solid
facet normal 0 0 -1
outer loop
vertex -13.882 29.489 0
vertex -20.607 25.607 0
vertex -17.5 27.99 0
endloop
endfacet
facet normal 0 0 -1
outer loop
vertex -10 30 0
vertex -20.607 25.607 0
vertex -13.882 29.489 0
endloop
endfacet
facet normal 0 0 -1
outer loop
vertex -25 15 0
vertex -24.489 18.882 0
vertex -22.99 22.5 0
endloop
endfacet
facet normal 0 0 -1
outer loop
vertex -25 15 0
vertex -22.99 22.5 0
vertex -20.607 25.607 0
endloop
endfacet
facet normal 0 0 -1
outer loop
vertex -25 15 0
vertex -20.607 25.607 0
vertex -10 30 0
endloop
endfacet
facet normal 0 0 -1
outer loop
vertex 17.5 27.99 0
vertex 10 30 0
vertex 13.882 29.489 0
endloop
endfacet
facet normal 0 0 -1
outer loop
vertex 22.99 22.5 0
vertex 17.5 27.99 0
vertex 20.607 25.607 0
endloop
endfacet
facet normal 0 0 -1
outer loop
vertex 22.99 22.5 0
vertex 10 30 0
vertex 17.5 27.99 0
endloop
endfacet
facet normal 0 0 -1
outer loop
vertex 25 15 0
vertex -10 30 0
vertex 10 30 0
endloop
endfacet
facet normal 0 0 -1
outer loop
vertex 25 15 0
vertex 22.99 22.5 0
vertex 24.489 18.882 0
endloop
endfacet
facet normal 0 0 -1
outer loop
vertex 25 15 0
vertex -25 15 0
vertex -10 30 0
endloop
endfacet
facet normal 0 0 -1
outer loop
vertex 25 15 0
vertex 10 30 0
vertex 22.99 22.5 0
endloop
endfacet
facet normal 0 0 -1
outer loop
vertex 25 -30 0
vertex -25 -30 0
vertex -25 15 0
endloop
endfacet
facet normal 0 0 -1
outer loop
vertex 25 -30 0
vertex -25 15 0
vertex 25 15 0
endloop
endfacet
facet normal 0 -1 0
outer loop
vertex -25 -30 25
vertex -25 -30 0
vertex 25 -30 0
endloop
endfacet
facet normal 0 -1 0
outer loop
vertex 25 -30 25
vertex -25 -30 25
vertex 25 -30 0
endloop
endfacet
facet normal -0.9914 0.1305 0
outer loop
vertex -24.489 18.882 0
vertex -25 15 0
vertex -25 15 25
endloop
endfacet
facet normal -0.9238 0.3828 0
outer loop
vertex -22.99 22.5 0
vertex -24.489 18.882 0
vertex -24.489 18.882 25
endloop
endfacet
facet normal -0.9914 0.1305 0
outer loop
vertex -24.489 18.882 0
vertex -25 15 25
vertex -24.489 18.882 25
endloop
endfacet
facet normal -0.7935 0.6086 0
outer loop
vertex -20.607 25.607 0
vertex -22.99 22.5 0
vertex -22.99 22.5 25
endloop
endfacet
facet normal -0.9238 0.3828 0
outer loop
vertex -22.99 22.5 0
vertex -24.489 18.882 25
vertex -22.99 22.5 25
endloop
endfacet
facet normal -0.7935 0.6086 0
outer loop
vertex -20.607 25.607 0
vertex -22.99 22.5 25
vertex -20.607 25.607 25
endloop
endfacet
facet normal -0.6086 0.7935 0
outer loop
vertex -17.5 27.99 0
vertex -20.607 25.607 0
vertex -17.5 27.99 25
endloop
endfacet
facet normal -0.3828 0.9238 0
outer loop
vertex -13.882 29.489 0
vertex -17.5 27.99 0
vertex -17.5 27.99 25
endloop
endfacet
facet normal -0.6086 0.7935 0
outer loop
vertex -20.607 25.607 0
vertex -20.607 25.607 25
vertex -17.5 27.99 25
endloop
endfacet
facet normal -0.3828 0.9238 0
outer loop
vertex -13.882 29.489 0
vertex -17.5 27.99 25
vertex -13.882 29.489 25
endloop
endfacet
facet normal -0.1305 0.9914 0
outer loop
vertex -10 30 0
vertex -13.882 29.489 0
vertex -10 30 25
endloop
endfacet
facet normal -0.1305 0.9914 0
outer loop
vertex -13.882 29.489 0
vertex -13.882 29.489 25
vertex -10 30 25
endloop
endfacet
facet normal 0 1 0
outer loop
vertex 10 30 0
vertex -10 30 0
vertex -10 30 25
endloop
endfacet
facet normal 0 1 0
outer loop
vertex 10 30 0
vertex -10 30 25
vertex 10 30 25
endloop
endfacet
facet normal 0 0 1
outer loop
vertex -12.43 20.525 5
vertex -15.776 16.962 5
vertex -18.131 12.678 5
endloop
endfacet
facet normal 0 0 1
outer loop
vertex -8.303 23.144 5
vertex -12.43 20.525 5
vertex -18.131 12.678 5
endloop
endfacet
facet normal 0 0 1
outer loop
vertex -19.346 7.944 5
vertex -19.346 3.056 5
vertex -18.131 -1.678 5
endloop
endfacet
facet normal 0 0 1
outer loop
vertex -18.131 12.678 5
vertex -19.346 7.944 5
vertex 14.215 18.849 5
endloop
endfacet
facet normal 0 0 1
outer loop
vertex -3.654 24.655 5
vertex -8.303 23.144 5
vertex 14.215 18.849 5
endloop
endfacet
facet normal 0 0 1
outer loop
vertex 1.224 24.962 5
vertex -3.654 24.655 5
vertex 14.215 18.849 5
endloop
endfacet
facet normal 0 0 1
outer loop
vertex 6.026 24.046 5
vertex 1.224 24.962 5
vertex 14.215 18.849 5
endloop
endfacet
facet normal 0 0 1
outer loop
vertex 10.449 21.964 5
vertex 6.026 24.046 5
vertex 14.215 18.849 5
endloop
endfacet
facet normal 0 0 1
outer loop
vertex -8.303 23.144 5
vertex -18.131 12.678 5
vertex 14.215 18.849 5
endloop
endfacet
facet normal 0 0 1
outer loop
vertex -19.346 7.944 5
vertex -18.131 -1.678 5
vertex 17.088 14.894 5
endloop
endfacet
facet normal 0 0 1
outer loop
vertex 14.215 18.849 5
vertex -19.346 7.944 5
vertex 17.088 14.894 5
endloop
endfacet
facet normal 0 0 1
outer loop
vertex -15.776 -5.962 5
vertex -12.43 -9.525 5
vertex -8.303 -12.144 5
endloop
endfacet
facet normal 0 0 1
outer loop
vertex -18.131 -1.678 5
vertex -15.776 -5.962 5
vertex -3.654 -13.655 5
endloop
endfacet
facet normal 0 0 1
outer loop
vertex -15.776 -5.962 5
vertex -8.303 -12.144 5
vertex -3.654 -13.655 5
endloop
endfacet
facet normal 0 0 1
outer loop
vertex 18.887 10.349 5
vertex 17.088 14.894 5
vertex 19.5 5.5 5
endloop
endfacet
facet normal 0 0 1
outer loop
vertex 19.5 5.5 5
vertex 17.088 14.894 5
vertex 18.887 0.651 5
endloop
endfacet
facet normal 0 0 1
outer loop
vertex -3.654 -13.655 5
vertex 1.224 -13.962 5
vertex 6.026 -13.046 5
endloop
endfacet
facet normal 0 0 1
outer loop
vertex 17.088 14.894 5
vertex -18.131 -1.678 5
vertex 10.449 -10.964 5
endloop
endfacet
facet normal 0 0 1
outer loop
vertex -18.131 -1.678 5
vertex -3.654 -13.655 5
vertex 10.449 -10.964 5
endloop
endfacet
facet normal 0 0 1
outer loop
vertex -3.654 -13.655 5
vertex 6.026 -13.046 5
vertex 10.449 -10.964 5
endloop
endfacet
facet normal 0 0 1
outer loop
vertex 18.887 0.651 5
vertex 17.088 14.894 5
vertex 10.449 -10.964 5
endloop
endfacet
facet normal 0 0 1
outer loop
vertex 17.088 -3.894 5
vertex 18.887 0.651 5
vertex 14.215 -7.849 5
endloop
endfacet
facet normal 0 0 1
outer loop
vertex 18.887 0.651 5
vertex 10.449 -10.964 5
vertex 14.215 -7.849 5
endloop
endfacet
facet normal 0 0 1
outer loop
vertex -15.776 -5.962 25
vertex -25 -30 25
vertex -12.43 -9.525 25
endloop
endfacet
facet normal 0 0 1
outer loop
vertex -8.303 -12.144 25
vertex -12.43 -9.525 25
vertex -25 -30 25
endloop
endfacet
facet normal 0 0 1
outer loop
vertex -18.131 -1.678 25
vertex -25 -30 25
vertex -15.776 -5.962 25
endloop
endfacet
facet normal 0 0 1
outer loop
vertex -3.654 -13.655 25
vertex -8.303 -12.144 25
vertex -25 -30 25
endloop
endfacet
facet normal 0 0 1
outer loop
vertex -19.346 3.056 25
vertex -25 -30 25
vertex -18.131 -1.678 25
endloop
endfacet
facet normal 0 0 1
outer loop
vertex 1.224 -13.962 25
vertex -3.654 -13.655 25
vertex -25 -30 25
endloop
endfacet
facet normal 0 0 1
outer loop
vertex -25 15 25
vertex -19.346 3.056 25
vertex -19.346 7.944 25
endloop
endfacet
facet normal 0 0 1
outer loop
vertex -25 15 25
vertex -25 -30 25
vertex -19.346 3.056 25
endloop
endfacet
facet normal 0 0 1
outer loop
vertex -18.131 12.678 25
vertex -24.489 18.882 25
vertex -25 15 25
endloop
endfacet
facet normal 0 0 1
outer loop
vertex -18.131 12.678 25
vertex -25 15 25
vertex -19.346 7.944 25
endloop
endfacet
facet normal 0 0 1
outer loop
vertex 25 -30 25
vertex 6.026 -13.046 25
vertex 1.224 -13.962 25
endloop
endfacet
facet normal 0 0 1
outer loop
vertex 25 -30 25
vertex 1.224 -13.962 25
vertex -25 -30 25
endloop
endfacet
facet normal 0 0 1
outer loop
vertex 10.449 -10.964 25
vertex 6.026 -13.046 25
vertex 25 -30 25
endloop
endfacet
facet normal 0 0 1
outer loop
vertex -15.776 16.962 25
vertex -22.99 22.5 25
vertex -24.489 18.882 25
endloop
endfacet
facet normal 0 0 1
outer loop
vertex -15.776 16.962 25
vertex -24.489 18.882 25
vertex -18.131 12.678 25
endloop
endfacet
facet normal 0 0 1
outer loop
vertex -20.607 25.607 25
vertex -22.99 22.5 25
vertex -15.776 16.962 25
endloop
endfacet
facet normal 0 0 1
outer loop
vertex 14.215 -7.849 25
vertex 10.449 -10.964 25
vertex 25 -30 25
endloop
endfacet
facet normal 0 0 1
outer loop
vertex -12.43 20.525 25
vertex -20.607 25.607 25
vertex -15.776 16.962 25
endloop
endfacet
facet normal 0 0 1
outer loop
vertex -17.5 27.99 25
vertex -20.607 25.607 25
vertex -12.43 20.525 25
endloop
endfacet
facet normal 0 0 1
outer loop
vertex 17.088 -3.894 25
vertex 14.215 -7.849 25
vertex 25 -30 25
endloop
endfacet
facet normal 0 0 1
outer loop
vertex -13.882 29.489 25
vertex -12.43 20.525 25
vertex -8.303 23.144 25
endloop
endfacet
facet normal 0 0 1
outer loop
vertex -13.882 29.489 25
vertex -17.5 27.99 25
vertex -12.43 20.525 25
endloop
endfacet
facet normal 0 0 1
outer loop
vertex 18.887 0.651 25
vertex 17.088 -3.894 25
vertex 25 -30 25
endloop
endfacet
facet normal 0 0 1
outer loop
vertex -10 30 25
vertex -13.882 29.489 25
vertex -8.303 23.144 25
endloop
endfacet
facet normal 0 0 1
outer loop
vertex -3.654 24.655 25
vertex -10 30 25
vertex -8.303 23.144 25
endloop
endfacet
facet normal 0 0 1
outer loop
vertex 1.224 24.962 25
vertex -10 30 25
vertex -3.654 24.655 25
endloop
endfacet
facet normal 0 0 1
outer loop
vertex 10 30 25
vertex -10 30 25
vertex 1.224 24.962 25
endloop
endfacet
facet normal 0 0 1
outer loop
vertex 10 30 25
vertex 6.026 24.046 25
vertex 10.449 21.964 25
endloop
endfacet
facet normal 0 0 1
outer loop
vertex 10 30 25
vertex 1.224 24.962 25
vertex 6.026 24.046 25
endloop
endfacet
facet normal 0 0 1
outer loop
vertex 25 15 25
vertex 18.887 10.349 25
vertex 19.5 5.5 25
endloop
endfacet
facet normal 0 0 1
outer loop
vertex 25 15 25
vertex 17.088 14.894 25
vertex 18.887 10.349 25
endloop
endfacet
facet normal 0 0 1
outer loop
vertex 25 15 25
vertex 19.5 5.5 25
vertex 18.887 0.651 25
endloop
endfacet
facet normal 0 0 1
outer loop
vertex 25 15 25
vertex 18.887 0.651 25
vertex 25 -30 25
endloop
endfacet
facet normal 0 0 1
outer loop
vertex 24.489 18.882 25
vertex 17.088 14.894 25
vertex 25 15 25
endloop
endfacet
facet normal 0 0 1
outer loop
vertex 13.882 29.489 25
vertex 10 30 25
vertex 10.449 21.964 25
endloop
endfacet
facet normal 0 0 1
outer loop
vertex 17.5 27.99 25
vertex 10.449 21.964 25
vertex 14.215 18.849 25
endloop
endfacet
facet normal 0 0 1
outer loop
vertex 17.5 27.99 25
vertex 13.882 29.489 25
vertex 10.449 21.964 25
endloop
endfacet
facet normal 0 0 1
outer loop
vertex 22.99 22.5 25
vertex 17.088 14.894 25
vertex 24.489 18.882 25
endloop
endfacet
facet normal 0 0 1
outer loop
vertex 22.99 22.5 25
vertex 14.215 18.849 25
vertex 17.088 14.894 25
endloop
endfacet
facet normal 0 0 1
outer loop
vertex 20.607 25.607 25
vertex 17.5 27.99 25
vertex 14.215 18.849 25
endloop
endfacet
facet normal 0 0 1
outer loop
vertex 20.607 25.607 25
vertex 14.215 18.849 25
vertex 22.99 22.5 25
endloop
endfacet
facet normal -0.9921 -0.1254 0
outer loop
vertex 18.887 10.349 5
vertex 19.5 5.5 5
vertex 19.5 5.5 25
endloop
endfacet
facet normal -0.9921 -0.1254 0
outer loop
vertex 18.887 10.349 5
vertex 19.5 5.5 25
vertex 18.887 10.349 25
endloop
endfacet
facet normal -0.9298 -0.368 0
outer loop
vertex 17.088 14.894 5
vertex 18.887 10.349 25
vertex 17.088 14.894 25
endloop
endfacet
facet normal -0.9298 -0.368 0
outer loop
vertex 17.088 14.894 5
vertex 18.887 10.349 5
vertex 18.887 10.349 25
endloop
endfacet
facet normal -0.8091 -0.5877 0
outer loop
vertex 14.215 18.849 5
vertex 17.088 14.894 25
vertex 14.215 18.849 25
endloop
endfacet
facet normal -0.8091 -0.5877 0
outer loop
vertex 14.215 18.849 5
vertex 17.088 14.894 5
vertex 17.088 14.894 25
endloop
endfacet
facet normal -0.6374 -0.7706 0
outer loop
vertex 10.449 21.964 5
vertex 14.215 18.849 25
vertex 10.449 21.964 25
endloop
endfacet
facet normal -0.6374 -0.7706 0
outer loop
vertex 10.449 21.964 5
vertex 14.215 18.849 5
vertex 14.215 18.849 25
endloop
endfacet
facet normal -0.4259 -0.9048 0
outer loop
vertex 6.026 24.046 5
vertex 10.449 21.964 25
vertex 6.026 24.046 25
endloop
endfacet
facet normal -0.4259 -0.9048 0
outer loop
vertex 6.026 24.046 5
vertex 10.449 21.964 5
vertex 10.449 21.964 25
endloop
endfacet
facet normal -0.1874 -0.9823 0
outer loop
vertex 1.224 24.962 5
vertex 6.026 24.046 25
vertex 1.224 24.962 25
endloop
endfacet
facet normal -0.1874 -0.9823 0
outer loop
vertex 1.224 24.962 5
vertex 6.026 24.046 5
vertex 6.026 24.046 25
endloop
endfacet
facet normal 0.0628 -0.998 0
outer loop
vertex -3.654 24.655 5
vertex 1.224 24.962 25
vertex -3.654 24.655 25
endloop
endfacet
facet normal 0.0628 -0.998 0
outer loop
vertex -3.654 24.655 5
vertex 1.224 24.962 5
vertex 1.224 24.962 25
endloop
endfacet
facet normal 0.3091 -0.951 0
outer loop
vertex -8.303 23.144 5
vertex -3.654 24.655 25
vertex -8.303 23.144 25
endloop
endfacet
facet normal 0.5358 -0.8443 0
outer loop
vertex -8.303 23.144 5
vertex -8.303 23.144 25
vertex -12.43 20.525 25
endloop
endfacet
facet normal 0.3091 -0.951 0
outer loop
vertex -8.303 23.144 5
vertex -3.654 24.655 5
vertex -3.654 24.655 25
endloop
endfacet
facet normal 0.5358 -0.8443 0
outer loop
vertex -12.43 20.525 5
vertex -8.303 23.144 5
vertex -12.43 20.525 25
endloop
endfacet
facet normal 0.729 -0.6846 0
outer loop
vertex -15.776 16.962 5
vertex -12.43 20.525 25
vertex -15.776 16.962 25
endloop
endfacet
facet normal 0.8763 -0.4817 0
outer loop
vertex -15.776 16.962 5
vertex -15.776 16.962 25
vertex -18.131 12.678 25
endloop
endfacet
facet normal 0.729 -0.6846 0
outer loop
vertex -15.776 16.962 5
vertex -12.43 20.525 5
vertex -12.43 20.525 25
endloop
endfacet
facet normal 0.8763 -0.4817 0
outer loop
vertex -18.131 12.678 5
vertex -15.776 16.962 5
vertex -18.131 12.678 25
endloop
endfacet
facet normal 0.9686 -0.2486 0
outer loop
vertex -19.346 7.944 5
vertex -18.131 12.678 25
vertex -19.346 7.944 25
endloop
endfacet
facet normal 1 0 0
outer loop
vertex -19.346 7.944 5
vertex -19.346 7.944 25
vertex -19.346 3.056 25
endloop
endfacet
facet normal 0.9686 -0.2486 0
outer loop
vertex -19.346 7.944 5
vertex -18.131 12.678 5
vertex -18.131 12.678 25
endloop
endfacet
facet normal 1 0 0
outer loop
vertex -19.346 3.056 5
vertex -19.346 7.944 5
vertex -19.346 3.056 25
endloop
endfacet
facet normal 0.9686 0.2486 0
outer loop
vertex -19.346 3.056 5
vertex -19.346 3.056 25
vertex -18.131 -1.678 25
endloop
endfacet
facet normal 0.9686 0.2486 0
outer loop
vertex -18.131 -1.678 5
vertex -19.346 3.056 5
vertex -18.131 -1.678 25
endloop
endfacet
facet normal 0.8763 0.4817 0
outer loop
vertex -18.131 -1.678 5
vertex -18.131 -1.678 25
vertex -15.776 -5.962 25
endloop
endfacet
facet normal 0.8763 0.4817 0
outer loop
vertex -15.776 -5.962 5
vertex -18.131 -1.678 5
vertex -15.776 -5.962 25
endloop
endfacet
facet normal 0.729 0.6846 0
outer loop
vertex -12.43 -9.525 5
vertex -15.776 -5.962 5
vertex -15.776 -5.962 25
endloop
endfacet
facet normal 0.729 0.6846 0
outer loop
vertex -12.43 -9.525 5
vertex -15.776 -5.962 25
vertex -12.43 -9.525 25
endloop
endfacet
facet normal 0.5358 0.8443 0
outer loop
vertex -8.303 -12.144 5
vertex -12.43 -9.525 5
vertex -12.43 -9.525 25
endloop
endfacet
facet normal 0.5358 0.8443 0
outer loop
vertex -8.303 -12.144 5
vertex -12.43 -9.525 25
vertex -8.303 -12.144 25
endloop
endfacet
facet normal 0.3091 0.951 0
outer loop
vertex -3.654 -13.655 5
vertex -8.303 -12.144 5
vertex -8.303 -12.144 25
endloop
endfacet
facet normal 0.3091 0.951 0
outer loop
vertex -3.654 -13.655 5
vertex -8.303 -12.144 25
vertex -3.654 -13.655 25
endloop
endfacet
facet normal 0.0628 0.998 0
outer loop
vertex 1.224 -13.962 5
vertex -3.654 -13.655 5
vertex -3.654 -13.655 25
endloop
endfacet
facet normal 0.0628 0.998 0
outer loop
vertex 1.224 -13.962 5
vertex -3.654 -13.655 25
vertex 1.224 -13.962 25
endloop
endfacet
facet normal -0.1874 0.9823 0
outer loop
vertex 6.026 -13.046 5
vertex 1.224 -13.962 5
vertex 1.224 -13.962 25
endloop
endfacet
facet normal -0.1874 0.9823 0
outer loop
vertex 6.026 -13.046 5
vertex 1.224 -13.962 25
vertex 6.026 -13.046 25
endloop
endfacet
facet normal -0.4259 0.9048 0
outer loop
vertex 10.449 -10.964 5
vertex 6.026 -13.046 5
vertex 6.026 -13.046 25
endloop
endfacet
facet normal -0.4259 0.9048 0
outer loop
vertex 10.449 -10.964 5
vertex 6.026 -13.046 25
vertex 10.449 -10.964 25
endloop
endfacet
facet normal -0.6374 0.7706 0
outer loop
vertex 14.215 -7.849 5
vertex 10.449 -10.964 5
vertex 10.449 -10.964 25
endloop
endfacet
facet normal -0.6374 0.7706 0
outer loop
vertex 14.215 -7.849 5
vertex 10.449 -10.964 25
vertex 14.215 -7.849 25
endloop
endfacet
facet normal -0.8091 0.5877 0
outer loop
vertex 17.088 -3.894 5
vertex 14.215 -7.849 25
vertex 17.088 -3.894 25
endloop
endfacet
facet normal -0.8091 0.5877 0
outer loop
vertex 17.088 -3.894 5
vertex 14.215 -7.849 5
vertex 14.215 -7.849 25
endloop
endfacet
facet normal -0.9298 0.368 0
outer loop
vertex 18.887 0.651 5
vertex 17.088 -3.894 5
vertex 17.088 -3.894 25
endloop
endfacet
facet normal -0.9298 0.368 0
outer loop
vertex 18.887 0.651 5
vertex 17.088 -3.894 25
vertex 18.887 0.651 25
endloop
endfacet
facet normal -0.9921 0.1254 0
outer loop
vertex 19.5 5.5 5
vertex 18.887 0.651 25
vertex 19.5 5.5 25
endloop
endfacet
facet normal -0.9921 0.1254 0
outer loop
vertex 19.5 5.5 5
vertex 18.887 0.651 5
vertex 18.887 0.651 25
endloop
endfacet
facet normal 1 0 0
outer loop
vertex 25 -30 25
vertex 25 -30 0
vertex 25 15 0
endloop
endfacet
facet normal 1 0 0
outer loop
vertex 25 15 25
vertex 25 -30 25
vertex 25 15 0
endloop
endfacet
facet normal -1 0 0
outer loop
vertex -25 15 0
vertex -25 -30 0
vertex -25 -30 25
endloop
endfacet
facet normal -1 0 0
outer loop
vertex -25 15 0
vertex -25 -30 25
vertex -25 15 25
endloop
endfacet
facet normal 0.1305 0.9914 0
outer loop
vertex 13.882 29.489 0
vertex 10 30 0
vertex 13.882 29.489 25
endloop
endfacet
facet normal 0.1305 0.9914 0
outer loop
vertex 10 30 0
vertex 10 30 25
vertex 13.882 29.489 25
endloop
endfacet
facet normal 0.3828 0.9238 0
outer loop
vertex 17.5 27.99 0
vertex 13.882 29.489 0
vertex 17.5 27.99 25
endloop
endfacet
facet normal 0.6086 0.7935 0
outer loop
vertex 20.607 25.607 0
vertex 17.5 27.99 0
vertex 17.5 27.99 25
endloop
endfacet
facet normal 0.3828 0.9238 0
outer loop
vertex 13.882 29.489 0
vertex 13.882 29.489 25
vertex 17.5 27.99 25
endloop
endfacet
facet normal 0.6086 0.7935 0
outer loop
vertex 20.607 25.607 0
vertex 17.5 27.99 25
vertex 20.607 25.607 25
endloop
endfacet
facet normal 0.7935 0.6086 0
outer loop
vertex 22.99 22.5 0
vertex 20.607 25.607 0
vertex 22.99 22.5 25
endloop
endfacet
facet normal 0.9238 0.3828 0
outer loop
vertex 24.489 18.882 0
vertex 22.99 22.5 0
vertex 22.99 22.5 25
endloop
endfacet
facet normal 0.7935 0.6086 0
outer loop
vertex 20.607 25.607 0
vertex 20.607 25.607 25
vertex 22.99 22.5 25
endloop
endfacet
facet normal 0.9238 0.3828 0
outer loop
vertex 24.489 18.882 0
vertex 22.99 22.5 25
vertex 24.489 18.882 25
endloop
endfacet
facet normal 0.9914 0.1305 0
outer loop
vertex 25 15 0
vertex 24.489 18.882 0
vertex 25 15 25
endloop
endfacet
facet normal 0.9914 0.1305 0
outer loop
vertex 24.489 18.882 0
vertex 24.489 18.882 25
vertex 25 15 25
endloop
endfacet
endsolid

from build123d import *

# Parameters (mm, degrees)
F0_W     = 50
F0_H     = 60
F0_R     = 19.5
F1_DEPTH = 25
F2_R     = 15
F3_R     = 15
F4_R     = 19.5
F5_DEPTH = 5


with BuildPart() as f1:
    # F0 (on Top) → F1 (new body)
    with BuildSketch(Plane.XY):
        Rectangle(F0_W, F0_H)
        with Locations((0, 5.5)):
            Circle(F0_R, mode=Mode.SUBTRACT)
    extrude(amount=F1_DEPTH)

    # F2
    f2_edges = [f1.edges().sort_by_distance(p)[0] for p in [
        (-25, 30, 12.5),
    ]]
    fillet(f2_edges, radius=F2_R)

    # F3
    f3_edges = [f1.edges().sort_by_distance(p)[0] for p in [
        (25, 30, 12.5),
    ]]
    fillet(f3_edges, radius=F3_R)

    # F4 (on face) → F5 (join)
    with BuildSketch(Plane(origin=(0, 0, 0), x_dir=(1, 0, 0), z_dir=(0, 0, -1))):
        with Locations((0, -5.5)):
            Circle(F4_R)
    extrude(amount=-F5_DEPTH)


solid = f1.part
